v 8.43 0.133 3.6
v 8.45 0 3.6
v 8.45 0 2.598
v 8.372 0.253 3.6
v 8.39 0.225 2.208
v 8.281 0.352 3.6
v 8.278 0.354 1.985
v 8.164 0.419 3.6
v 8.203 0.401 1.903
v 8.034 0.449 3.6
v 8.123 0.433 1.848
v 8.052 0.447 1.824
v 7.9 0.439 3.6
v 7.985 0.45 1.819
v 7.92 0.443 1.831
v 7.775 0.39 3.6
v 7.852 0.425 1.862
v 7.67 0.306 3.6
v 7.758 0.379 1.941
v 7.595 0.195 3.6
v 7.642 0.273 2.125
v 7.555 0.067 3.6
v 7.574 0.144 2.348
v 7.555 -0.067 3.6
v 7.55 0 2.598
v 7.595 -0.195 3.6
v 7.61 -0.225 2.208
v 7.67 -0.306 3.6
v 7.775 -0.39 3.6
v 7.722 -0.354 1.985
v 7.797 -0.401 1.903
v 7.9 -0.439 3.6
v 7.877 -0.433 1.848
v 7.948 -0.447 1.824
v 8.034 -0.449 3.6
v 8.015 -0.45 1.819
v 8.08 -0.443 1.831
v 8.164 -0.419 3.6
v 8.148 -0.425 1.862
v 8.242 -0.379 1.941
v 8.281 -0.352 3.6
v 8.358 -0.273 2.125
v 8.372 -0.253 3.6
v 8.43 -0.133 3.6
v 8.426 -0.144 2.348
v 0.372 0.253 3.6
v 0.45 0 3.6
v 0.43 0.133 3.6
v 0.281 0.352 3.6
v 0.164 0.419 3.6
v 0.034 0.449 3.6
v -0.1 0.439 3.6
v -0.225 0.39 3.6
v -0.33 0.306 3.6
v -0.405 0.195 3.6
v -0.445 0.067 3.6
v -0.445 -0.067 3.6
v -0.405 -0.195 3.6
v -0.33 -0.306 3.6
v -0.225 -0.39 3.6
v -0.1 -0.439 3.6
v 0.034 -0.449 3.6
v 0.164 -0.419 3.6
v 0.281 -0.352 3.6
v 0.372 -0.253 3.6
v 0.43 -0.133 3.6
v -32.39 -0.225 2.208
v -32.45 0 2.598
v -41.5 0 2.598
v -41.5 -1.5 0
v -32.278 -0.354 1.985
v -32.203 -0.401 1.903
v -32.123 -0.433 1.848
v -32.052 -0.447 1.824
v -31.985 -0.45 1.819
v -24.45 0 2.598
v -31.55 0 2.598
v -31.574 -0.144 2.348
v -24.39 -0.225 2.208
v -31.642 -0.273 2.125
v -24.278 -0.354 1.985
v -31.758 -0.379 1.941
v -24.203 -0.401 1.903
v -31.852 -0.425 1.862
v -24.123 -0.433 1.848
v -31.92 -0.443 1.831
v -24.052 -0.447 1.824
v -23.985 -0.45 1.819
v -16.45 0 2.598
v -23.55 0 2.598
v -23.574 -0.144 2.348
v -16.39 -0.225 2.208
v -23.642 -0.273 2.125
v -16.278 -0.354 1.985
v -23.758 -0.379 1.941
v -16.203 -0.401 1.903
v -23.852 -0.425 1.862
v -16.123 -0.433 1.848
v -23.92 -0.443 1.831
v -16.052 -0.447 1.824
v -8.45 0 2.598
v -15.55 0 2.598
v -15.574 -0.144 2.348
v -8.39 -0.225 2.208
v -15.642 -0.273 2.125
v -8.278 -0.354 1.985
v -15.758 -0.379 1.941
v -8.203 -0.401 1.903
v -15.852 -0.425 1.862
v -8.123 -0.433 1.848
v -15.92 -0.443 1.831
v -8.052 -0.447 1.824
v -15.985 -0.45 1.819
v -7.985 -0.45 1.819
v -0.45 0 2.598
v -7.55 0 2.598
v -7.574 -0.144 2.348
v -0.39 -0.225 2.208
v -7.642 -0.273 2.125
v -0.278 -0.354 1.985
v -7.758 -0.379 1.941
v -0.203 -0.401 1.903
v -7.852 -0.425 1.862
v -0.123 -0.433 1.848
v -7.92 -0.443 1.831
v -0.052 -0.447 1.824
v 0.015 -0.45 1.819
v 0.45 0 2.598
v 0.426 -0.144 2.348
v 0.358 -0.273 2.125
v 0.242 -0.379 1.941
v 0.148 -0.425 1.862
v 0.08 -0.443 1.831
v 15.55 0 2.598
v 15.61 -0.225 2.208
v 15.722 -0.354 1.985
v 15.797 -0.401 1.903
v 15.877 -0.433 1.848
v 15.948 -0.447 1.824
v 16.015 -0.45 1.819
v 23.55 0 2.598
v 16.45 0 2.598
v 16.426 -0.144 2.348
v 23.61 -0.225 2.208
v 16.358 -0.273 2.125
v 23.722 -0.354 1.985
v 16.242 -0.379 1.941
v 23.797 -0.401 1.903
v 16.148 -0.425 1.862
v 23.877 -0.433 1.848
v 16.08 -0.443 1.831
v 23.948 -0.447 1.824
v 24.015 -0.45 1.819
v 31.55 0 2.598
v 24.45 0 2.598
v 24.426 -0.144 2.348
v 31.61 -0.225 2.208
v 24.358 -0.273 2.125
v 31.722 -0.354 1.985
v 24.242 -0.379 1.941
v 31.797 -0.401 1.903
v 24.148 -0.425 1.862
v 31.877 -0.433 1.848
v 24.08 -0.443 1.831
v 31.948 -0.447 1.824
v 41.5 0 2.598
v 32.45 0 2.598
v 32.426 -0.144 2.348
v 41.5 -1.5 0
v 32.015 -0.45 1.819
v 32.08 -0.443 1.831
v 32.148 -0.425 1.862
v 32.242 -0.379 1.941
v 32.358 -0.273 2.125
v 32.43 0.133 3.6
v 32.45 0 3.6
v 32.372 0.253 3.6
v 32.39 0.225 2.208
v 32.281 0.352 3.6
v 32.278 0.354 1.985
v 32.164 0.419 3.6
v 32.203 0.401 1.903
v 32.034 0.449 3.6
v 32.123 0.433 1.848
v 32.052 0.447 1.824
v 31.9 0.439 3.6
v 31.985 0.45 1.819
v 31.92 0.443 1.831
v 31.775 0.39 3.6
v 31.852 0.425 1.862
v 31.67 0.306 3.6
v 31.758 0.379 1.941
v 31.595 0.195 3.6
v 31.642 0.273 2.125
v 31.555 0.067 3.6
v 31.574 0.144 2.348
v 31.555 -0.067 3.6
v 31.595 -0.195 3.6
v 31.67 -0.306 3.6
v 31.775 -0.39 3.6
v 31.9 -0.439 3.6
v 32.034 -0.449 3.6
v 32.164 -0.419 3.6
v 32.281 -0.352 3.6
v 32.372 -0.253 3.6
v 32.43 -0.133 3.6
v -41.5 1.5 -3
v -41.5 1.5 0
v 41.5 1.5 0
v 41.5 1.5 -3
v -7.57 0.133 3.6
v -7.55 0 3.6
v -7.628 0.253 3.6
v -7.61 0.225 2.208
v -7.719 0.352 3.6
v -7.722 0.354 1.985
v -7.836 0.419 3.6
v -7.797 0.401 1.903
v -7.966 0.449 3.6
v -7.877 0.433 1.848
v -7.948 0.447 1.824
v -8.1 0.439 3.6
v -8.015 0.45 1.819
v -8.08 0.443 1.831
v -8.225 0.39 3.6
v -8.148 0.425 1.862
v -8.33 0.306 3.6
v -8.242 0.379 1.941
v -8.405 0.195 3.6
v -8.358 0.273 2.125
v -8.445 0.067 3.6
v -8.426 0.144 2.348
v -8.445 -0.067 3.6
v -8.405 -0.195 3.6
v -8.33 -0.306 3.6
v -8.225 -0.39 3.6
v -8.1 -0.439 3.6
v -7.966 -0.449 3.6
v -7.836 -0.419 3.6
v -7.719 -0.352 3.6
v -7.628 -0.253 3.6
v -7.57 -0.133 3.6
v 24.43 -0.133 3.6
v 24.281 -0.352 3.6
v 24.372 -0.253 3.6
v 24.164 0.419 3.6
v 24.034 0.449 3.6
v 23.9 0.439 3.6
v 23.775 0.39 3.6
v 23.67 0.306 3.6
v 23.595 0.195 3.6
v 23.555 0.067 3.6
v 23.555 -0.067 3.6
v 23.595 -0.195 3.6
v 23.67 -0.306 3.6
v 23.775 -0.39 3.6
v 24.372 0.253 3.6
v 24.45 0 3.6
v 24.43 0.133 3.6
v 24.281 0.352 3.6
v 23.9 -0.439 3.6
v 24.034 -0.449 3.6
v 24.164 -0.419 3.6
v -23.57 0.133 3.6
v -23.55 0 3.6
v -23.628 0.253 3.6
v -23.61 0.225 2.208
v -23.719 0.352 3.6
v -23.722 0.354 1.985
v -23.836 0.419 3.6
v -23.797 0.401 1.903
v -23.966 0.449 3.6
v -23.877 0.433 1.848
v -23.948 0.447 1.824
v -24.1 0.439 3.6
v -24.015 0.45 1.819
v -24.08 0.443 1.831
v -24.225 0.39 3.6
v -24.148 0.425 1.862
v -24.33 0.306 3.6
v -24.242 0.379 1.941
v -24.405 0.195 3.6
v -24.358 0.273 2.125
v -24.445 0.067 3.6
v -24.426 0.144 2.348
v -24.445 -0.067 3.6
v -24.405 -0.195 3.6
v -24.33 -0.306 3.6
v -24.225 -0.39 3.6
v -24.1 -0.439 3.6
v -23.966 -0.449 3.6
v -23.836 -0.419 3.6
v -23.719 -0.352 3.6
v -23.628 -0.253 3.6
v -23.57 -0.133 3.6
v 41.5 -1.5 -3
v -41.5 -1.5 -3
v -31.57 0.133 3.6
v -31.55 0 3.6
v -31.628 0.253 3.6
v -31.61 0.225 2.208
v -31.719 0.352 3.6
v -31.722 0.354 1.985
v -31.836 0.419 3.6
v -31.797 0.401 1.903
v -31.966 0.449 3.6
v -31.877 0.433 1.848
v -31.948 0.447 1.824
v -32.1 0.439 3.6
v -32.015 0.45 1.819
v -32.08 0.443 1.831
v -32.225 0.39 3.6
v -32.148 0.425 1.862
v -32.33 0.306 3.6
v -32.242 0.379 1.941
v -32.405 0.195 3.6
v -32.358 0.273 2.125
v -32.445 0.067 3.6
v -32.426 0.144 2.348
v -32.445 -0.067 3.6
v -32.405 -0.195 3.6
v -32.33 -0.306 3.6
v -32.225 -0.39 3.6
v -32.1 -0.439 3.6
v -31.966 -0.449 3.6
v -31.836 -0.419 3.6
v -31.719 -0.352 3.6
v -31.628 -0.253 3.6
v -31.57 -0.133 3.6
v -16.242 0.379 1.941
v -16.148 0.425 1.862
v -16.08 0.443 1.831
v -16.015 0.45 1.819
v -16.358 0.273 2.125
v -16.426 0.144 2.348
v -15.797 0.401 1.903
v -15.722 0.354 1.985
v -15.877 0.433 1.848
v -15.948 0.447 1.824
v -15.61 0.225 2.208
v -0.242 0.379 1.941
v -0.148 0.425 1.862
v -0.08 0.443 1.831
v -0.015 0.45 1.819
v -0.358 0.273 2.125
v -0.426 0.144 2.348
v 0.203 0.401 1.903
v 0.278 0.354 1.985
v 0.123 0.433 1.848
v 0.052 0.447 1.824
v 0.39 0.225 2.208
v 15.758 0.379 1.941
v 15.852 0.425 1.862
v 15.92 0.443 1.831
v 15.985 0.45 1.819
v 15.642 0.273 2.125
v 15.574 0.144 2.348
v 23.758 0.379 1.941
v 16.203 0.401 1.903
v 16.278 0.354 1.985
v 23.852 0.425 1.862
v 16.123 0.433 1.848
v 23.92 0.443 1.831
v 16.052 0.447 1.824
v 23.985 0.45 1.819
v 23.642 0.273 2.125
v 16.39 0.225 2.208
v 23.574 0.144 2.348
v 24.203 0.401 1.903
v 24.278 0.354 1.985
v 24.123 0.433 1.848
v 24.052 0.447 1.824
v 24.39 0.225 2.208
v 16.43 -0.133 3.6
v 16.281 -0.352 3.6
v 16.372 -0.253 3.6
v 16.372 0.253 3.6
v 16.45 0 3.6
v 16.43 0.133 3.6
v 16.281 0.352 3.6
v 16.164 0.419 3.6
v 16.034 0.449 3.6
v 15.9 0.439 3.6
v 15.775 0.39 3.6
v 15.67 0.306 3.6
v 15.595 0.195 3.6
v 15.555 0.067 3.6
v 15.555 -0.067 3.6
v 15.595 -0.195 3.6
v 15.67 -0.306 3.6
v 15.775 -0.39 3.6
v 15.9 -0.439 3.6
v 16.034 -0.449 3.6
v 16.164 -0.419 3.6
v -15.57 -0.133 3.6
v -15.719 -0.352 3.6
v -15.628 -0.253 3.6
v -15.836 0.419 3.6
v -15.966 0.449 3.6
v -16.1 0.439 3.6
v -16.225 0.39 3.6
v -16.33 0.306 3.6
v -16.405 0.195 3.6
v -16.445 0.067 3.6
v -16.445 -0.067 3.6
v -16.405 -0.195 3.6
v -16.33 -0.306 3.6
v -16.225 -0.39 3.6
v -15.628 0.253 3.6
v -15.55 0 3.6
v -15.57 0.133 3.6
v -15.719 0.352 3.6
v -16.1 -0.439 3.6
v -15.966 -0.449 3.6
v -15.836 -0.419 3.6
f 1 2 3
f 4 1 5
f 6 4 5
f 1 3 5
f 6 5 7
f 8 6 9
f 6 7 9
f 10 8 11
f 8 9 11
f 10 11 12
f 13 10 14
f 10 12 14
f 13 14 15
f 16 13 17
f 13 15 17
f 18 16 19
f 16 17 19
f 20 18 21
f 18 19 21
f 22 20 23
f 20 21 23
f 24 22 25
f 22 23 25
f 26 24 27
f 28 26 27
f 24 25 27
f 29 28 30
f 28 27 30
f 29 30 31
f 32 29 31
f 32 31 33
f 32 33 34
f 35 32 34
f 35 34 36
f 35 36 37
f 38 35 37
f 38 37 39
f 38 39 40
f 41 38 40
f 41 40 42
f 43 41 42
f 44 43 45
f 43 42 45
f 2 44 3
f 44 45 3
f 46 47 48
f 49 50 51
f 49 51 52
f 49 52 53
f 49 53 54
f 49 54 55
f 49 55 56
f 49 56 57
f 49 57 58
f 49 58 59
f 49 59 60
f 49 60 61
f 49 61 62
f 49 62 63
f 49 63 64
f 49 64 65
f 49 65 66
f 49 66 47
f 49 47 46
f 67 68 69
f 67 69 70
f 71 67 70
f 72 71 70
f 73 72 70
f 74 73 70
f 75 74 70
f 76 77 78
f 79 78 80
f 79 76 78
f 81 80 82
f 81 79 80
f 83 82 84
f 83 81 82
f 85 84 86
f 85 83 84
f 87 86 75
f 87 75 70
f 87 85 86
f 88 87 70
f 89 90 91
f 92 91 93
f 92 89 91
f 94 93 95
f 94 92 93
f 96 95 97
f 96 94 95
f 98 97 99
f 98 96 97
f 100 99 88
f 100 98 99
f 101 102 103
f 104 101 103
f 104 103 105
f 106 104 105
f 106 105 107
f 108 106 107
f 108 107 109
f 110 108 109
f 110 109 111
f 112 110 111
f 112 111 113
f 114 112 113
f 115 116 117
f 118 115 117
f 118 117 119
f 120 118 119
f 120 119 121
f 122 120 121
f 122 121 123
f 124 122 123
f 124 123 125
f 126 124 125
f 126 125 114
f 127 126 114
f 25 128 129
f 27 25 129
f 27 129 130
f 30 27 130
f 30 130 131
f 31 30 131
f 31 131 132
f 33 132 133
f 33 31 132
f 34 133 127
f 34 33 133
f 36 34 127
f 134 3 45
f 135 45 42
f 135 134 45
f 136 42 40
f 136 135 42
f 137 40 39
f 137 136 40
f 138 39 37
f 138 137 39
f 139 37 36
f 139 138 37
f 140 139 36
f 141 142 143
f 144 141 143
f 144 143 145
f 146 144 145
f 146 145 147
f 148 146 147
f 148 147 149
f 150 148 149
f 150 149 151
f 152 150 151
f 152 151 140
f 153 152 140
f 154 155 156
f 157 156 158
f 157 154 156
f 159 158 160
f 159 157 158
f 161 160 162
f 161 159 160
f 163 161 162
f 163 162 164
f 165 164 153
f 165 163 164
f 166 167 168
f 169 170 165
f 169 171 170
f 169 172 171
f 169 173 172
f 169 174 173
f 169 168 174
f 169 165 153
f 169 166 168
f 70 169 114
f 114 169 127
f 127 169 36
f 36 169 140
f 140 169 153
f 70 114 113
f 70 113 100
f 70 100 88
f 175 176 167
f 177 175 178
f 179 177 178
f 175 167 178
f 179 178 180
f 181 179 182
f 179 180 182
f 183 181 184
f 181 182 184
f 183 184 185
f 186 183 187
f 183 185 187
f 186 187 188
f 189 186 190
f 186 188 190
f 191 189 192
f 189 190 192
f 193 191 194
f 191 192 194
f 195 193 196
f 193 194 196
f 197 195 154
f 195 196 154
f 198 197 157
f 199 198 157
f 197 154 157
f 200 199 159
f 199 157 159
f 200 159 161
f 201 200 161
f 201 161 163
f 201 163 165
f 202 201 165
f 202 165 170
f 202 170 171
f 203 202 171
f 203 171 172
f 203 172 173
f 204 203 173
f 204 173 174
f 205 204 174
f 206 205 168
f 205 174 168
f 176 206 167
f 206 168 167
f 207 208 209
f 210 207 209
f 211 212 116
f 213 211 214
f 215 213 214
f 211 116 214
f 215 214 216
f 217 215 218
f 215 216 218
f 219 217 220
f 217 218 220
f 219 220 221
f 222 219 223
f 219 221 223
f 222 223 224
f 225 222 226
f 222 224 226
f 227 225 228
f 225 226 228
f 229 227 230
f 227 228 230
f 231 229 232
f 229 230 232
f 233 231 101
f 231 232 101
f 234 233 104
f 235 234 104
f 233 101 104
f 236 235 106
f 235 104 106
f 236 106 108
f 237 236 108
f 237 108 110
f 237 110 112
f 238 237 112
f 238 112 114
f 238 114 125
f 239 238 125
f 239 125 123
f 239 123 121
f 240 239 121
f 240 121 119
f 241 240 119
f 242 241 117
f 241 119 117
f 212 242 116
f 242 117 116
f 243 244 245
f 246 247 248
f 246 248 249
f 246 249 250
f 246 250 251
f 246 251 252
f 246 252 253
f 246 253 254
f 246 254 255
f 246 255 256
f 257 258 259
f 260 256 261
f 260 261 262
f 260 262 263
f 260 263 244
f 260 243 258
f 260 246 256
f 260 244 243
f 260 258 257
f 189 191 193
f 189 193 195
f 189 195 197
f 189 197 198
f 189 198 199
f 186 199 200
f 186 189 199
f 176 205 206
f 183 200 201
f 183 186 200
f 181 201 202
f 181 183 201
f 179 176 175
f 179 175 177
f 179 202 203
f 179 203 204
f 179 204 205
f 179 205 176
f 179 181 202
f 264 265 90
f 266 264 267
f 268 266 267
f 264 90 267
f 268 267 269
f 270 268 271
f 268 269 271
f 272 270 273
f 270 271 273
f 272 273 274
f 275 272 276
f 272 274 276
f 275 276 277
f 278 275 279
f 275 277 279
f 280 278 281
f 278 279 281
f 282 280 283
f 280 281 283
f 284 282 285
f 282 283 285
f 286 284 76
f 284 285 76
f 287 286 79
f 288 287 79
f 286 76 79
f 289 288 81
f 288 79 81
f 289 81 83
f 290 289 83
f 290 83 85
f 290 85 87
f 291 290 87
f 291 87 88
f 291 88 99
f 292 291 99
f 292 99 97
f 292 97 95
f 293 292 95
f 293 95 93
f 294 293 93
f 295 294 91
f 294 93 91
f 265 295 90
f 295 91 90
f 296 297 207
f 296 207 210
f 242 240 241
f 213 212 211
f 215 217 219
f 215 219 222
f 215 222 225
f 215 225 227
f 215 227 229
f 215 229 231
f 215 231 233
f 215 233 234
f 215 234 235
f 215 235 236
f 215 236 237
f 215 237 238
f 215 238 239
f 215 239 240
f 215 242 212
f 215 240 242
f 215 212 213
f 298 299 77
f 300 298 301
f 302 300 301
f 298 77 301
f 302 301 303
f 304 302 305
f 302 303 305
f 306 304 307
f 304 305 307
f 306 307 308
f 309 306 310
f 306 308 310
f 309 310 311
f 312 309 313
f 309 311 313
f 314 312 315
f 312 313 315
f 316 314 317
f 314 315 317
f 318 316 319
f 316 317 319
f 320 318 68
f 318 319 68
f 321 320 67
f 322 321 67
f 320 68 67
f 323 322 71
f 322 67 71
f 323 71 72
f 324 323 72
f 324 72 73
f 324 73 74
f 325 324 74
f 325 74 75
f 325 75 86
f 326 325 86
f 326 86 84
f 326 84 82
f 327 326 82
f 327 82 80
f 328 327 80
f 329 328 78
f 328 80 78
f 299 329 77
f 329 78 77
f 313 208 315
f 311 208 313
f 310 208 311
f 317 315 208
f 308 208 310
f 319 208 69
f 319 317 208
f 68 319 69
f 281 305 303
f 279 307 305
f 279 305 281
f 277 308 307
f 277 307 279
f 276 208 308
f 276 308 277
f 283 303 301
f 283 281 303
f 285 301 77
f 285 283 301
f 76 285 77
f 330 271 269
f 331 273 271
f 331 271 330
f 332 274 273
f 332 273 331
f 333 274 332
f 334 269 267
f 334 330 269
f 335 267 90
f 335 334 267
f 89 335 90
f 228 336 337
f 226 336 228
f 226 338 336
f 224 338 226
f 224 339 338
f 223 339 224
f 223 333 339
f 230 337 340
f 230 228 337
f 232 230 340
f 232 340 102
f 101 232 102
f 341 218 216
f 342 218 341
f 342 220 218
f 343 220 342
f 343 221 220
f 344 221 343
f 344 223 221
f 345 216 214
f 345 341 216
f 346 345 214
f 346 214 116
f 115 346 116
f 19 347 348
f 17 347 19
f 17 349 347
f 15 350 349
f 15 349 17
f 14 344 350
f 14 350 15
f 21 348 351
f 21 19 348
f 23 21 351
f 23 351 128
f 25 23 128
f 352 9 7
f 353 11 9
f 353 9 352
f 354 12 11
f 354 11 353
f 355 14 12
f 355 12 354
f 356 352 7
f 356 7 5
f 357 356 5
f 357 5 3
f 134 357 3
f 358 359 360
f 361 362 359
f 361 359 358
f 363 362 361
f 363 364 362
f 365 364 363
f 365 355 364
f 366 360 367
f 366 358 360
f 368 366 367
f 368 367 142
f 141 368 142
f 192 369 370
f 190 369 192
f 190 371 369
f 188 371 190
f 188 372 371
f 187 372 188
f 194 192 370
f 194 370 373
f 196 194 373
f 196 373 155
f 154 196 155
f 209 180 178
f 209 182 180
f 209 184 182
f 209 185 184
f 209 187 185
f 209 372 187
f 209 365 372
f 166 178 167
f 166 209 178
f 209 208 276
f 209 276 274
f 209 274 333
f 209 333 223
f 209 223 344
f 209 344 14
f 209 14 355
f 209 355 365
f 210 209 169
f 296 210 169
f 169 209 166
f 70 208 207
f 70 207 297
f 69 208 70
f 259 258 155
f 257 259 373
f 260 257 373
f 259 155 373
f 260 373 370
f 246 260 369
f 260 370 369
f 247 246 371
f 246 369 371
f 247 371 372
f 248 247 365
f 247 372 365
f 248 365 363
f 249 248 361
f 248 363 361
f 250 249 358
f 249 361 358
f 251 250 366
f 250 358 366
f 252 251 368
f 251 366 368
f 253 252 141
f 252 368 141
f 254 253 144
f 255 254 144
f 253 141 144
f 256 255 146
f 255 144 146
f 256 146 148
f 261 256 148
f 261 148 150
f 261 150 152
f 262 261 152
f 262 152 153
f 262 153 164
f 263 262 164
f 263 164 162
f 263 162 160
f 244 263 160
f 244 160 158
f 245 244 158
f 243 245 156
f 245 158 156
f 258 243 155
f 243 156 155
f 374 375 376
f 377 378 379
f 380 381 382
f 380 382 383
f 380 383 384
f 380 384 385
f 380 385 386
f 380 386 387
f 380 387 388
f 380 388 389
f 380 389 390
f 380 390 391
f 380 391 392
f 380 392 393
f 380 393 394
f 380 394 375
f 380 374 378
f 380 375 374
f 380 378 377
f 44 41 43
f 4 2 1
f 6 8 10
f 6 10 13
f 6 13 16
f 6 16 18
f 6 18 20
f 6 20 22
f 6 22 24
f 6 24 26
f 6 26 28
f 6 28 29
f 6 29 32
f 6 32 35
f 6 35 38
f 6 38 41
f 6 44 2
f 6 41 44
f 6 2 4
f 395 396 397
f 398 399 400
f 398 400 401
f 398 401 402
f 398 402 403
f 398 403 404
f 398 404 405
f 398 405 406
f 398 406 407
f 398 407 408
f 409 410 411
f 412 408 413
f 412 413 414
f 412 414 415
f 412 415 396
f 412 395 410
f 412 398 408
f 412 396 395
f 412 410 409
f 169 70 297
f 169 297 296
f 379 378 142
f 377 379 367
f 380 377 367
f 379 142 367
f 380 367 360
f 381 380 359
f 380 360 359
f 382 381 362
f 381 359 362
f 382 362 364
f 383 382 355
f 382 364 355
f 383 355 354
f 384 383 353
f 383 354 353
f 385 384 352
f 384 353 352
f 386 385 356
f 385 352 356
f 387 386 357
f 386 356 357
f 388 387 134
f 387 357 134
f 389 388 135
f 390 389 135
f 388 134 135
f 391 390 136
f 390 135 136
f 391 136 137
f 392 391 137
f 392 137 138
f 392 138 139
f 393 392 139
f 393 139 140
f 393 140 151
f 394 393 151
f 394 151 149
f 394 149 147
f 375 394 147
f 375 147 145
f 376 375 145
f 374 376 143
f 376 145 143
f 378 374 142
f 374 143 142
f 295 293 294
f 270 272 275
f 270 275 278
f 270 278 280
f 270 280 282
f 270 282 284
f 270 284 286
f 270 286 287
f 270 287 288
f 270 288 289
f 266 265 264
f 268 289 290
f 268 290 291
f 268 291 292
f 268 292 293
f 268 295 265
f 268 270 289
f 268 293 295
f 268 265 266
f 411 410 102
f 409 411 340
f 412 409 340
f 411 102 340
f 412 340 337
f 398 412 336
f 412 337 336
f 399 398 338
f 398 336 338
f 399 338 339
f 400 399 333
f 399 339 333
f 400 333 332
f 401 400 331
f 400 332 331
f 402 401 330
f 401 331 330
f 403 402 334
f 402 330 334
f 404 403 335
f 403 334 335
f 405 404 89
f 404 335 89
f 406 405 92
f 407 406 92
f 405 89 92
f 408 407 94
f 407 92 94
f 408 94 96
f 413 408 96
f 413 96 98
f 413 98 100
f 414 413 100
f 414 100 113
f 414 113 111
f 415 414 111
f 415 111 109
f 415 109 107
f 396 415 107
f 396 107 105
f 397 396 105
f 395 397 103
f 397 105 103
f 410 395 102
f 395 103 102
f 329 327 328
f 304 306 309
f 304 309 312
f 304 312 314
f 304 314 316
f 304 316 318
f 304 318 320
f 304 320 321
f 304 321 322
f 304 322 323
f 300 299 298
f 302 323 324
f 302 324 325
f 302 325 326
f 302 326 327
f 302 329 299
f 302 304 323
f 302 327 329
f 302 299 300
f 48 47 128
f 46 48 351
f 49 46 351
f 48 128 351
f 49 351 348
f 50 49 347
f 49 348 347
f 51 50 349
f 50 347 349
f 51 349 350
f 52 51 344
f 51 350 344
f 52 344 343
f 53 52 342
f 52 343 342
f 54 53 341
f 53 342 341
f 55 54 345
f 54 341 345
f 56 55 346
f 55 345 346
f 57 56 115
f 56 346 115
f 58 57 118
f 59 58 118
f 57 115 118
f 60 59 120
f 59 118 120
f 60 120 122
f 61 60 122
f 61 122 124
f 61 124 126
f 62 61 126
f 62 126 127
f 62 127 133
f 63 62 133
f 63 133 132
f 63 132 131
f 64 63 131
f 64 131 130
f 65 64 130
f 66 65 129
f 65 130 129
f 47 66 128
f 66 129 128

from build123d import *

# Parameters (mm, degrees)
F1_DEPTH  = 41.5
F2_R      = 0.45
F3_DEPTH  = 3.6
F1_FACE_W = 83
F1_FACE_H = 3
F4_DEPTH  = 3


with BuildPart() as f1:
    # F0 (on Right) → F1 (new body, symmetric)
    with BuildSketch(Plane.YZ):
        Polygon((0, 2.598076), (-1.5, 0), (1.5, 0), align=None)
    extrude(amount=F1_DEPTH, both=True)

    # F2 (on Top) → F3 (join)
    with BuildSketch(Plane.XY):
        with Locations((-32, 0)):
            Circle(F2_R)
        with Locations((-24, 0)):
            Circle(F2_R)
        with Locations((-16, 0)):
            Circle(F2_R)
        with Locations((-8, 0)):
            Circle(F2_R)
        Circle(F2_R)
        with Locations((8, 0)):
            Circle(F2_R)
        with Locations((16, 0)):
            Circle(F2_R)
        with Locations((24, 0)):
            Circle(F2_R)
        with Locations((32, 0)):
            Circle(F2_R)
    extrude(amount=F3_DEPTH)

    # F1_face (on face) → F4 (join)
    with BuildSketch(Plane(origin=(0, 0, 0), x_dir=(1, 0, 0), z_dir=(0, 0, -1))):
        Rectangle(F1_FACE_W, F1_FACE_H)
    extrude(amount=F4_DEPTH)


solid = f1.part
